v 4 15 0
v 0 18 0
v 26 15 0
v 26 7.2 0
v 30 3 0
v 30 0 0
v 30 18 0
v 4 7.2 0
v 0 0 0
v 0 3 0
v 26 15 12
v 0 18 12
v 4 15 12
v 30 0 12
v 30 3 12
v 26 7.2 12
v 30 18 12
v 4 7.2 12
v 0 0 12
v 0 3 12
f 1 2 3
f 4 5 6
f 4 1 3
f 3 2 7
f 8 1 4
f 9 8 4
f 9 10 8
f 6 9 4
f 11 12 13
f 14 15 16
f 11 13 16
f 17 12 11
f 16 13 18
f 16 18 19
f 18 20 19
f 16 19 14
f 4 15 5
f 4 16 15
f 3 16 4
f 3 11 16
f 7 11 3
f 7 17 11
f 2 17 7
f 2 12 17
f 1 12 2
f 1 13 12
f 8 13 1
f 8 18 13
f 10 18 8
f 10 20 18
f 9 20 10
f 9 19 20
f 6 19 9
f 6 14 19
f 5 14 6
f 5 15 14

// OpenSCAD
$fn = 32;

// ----------------------------------------------------------------------
// Key bar: dovetail key, 12 mm thick
// ----------------------------------------------------------------------

// --- parameters (mm) ---
profile_height = 12;      // extrusion height
profile_points = 10;      // points of the closed outline

profile = [[0, 0], [30, 0], [30, 3], [26, 7.2], [26, 15], [30, 18], [0, 18], [4, 15], [4, 7.2], [0, 3]];  // single closed polygon, 10 points, counter clockwise

// --- the one profile operation ---
linear_extrude(height = profile_height) polygon(points = profile);
